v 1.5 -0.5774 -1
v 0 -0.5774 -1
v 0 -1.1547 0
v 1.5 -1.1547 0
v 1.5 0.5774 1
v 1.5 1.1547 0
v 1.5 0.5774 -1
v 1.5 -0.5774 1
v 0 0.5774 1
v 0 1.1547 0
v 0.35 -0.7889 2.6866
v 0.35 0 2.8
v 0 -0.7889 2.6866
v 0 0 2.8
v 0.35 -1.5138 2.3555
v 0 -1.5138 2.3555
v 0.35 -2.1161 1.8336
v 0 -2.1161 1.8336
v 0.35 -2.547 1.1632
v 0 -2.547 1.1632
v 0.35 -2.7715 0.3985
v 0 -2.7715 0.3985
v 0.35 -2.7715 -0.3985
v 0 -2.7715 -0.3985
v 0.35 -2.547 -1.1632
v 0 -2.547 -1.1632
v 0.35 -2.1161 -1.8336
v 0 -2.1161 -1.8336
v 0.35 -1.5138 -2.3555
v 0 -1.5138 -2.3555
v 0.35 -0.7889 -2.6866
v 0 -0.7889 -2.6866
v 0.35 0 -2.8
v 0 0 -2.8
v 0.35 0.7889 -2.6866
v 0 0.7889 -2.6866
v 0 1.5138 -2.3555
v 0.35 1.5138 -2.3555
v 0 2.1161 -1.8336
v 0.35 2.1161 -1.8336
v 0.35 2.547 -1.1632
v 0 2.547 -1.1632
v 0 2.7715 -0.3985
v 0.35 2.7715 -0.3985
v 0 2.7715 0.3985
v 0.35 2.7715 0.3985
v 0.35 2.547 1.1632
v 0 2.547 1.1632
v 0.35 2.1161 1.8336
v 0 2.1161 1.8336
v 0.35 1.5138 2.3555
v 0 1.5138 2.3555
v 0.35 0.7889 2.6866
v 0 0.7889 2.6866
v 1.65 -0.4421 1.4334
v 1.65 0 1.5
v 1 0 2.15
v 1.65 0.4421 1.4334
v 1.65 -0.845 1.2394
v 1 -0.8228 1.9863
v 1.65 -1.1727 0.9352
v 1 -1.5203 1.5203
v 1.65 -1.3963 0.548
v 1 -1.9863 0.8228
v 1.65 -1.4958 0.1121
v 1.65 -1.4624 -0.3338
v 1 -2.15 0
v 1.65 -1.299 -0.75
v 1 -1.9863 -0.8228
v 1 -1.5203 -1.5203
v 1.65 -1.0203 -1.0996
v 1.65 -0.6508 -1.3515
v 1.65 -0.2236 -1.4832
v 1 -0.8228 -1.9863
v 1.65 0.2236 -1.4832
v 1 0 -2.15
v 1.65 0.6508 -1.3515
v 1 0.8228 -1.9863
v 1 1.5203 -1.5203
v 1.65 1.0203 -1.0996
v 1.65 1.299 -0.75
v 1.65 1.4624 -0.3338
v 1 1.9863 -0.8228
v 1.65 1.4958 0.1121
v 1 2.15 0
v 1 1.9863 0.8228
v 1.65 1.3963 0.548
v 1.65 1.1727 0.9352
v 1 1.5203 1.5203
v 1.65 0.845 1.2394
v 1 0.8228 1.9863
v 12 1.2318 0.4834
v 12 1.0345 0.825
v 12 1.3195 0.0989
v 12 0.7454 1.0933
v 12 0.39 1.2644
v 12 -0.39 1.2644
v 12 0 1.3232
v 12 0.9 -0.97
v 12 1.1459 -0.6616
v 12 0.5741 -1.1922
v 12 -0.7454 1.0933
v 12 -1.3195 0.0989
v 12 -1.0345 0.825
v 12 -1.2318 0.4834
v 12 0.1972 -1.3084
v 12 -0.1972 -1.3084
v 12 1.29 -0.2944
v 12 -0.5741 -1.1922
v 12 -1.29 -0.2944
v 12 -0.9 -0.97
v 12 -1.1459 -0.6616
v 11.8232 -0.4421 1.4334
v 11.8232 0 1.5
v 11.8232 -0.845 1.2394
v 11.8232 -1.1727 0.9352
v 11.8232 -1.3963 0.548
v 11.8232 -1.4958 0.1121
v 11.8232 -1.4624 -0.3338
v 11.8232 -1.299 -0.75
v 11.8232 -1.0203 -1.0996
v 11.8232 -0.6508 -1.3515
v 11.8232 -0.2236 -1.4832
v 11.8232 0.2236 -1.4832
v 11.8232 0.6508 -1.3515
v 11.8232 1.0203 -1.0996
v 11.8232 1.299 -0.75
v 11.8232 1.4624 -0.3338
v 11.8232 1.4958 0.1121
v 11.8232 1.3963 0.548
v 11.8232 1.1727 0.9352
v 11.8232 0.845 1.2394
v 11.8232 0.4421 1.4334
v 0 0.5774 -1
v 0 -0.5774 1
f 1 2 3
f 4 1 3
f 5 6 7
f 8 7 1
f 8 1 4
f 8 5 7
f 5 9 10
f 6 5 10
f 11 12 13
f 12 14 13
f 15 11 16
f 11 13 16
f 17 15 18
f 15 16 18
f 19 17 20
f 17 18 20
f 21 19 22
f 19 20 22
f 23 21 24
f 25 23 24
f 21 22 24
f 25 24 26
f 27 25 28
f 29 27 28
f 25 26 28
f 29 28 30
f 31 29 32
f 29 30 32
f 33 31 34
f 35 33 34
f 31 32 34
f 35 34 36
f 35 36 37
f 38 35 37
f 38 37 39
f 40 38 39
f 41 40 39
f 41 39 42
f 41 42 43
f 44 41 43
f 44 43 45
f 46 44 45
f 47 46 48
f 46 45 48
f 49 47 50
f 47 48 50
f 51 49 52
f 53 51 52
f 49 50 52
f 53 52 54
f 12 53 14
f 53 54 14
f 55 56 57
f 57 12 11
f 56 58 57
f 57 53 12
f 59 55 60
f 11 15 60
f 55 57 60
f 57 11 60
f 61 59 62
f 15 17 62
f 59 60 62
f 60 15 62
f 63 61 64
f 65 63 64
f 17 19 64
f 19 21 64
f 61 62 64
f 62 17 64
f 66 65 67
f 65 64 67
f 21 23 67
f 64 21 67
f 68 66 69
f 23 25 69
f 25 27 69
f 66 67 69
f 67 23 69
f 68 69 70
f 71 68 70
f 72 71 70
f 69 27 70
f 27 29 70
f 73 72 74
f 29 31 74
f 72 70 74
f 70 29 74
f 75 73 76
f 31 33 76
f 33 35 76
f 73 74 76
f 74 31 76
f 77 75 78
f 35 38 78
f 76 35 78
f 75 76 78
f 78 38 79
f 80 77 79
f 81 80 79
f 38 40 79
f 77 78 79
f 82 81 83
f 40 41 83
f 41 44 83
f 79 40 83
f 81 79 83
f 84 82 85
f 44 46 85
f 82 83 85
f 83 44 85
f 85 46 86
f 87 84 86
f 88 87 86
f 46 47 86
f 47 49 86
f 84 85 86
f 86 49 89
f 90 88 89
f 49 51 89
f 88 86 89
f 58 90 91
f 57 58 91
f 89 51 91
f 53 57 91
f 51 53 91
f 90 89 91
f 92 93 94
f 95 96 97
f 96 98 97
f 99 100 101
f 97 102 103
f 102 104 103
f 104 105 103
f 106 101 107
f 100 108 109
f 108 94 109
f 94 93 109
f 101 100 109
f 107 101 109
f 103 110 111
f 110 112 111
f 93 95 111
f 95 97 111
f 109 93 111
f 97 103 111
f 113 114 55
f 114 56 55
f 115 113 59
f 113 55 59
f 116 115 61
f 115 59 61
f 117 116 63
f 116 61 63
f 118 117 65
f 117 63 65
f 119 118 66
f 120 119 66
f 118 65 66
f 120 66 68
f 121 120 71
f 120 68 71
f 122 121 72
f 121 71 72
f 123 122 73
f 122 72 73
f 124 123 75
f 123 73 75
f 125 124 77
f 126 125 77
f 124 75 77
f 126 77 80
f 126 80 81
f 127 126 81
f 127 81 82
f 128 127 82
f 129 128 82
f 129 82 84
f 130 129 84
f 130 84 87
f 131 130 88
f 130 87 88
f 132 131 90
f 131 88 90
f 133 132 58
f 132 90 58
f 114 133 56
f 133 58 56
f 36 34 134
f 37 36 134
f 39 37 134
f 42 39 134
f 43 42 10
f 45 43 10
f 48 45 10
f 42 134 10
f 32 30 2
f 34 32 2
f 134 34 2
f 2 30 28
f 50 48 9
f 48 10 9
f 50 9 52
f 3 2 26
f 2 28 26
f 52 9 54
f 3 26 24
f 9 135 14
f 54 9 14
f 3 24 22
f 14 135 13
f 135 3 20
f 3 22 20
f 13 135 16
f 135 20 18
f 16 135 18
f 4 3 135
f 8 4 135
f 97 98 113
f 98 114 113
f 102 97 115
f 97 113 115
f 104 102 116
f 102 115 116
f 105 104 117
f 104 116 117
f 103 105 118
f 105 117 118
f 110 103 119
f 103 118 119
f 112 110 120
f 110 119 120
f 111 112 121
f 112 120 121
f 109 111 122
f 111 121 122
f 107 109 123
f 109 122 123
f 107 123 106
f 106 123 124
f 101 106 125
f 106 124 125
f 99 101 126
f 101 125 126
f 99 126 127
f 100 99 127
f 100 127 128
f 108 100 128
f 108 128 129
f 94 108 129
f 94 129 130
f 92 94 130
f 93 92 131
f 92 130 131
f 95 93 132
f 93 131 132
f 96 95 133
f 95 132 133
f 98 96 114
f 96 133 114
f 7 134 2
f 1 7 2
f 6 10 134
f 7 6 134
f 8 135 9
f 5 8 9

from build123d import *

# Parameters (mm, degrees)
F3_DEPTH = 1.5


with BuildPart() as f1:
    # F0 (on Front) → F1 (revolve)
    with BuildSketch(Plane.XZ):
        Polygon((0, 2.8), (0, 0), (12, 0), (12, 1.323223), (11.823223, 1.5), (1.65, 1.5), (0.35, 2.8), align=None)
    revolve(axis=Axis((6, 0, 0), (1, 0, 0)))

    # F2 (on face) → F3 (cut)
    with BuildSketch(Plane(origin=(0, 0, 0), x_dir=(0, -1, 0), z_dir=(-1, 0, 0))):
        Polygon((1.154701, 0), (0.57735, 1), (-0.57735, 1), (-1.154701, 0), (-0.57735, -1), (0.57735, -1), align=None)
    extrude(amount=-F3_DEPTH, mode=Mode.SUBTRACT)


solid = f1.part
